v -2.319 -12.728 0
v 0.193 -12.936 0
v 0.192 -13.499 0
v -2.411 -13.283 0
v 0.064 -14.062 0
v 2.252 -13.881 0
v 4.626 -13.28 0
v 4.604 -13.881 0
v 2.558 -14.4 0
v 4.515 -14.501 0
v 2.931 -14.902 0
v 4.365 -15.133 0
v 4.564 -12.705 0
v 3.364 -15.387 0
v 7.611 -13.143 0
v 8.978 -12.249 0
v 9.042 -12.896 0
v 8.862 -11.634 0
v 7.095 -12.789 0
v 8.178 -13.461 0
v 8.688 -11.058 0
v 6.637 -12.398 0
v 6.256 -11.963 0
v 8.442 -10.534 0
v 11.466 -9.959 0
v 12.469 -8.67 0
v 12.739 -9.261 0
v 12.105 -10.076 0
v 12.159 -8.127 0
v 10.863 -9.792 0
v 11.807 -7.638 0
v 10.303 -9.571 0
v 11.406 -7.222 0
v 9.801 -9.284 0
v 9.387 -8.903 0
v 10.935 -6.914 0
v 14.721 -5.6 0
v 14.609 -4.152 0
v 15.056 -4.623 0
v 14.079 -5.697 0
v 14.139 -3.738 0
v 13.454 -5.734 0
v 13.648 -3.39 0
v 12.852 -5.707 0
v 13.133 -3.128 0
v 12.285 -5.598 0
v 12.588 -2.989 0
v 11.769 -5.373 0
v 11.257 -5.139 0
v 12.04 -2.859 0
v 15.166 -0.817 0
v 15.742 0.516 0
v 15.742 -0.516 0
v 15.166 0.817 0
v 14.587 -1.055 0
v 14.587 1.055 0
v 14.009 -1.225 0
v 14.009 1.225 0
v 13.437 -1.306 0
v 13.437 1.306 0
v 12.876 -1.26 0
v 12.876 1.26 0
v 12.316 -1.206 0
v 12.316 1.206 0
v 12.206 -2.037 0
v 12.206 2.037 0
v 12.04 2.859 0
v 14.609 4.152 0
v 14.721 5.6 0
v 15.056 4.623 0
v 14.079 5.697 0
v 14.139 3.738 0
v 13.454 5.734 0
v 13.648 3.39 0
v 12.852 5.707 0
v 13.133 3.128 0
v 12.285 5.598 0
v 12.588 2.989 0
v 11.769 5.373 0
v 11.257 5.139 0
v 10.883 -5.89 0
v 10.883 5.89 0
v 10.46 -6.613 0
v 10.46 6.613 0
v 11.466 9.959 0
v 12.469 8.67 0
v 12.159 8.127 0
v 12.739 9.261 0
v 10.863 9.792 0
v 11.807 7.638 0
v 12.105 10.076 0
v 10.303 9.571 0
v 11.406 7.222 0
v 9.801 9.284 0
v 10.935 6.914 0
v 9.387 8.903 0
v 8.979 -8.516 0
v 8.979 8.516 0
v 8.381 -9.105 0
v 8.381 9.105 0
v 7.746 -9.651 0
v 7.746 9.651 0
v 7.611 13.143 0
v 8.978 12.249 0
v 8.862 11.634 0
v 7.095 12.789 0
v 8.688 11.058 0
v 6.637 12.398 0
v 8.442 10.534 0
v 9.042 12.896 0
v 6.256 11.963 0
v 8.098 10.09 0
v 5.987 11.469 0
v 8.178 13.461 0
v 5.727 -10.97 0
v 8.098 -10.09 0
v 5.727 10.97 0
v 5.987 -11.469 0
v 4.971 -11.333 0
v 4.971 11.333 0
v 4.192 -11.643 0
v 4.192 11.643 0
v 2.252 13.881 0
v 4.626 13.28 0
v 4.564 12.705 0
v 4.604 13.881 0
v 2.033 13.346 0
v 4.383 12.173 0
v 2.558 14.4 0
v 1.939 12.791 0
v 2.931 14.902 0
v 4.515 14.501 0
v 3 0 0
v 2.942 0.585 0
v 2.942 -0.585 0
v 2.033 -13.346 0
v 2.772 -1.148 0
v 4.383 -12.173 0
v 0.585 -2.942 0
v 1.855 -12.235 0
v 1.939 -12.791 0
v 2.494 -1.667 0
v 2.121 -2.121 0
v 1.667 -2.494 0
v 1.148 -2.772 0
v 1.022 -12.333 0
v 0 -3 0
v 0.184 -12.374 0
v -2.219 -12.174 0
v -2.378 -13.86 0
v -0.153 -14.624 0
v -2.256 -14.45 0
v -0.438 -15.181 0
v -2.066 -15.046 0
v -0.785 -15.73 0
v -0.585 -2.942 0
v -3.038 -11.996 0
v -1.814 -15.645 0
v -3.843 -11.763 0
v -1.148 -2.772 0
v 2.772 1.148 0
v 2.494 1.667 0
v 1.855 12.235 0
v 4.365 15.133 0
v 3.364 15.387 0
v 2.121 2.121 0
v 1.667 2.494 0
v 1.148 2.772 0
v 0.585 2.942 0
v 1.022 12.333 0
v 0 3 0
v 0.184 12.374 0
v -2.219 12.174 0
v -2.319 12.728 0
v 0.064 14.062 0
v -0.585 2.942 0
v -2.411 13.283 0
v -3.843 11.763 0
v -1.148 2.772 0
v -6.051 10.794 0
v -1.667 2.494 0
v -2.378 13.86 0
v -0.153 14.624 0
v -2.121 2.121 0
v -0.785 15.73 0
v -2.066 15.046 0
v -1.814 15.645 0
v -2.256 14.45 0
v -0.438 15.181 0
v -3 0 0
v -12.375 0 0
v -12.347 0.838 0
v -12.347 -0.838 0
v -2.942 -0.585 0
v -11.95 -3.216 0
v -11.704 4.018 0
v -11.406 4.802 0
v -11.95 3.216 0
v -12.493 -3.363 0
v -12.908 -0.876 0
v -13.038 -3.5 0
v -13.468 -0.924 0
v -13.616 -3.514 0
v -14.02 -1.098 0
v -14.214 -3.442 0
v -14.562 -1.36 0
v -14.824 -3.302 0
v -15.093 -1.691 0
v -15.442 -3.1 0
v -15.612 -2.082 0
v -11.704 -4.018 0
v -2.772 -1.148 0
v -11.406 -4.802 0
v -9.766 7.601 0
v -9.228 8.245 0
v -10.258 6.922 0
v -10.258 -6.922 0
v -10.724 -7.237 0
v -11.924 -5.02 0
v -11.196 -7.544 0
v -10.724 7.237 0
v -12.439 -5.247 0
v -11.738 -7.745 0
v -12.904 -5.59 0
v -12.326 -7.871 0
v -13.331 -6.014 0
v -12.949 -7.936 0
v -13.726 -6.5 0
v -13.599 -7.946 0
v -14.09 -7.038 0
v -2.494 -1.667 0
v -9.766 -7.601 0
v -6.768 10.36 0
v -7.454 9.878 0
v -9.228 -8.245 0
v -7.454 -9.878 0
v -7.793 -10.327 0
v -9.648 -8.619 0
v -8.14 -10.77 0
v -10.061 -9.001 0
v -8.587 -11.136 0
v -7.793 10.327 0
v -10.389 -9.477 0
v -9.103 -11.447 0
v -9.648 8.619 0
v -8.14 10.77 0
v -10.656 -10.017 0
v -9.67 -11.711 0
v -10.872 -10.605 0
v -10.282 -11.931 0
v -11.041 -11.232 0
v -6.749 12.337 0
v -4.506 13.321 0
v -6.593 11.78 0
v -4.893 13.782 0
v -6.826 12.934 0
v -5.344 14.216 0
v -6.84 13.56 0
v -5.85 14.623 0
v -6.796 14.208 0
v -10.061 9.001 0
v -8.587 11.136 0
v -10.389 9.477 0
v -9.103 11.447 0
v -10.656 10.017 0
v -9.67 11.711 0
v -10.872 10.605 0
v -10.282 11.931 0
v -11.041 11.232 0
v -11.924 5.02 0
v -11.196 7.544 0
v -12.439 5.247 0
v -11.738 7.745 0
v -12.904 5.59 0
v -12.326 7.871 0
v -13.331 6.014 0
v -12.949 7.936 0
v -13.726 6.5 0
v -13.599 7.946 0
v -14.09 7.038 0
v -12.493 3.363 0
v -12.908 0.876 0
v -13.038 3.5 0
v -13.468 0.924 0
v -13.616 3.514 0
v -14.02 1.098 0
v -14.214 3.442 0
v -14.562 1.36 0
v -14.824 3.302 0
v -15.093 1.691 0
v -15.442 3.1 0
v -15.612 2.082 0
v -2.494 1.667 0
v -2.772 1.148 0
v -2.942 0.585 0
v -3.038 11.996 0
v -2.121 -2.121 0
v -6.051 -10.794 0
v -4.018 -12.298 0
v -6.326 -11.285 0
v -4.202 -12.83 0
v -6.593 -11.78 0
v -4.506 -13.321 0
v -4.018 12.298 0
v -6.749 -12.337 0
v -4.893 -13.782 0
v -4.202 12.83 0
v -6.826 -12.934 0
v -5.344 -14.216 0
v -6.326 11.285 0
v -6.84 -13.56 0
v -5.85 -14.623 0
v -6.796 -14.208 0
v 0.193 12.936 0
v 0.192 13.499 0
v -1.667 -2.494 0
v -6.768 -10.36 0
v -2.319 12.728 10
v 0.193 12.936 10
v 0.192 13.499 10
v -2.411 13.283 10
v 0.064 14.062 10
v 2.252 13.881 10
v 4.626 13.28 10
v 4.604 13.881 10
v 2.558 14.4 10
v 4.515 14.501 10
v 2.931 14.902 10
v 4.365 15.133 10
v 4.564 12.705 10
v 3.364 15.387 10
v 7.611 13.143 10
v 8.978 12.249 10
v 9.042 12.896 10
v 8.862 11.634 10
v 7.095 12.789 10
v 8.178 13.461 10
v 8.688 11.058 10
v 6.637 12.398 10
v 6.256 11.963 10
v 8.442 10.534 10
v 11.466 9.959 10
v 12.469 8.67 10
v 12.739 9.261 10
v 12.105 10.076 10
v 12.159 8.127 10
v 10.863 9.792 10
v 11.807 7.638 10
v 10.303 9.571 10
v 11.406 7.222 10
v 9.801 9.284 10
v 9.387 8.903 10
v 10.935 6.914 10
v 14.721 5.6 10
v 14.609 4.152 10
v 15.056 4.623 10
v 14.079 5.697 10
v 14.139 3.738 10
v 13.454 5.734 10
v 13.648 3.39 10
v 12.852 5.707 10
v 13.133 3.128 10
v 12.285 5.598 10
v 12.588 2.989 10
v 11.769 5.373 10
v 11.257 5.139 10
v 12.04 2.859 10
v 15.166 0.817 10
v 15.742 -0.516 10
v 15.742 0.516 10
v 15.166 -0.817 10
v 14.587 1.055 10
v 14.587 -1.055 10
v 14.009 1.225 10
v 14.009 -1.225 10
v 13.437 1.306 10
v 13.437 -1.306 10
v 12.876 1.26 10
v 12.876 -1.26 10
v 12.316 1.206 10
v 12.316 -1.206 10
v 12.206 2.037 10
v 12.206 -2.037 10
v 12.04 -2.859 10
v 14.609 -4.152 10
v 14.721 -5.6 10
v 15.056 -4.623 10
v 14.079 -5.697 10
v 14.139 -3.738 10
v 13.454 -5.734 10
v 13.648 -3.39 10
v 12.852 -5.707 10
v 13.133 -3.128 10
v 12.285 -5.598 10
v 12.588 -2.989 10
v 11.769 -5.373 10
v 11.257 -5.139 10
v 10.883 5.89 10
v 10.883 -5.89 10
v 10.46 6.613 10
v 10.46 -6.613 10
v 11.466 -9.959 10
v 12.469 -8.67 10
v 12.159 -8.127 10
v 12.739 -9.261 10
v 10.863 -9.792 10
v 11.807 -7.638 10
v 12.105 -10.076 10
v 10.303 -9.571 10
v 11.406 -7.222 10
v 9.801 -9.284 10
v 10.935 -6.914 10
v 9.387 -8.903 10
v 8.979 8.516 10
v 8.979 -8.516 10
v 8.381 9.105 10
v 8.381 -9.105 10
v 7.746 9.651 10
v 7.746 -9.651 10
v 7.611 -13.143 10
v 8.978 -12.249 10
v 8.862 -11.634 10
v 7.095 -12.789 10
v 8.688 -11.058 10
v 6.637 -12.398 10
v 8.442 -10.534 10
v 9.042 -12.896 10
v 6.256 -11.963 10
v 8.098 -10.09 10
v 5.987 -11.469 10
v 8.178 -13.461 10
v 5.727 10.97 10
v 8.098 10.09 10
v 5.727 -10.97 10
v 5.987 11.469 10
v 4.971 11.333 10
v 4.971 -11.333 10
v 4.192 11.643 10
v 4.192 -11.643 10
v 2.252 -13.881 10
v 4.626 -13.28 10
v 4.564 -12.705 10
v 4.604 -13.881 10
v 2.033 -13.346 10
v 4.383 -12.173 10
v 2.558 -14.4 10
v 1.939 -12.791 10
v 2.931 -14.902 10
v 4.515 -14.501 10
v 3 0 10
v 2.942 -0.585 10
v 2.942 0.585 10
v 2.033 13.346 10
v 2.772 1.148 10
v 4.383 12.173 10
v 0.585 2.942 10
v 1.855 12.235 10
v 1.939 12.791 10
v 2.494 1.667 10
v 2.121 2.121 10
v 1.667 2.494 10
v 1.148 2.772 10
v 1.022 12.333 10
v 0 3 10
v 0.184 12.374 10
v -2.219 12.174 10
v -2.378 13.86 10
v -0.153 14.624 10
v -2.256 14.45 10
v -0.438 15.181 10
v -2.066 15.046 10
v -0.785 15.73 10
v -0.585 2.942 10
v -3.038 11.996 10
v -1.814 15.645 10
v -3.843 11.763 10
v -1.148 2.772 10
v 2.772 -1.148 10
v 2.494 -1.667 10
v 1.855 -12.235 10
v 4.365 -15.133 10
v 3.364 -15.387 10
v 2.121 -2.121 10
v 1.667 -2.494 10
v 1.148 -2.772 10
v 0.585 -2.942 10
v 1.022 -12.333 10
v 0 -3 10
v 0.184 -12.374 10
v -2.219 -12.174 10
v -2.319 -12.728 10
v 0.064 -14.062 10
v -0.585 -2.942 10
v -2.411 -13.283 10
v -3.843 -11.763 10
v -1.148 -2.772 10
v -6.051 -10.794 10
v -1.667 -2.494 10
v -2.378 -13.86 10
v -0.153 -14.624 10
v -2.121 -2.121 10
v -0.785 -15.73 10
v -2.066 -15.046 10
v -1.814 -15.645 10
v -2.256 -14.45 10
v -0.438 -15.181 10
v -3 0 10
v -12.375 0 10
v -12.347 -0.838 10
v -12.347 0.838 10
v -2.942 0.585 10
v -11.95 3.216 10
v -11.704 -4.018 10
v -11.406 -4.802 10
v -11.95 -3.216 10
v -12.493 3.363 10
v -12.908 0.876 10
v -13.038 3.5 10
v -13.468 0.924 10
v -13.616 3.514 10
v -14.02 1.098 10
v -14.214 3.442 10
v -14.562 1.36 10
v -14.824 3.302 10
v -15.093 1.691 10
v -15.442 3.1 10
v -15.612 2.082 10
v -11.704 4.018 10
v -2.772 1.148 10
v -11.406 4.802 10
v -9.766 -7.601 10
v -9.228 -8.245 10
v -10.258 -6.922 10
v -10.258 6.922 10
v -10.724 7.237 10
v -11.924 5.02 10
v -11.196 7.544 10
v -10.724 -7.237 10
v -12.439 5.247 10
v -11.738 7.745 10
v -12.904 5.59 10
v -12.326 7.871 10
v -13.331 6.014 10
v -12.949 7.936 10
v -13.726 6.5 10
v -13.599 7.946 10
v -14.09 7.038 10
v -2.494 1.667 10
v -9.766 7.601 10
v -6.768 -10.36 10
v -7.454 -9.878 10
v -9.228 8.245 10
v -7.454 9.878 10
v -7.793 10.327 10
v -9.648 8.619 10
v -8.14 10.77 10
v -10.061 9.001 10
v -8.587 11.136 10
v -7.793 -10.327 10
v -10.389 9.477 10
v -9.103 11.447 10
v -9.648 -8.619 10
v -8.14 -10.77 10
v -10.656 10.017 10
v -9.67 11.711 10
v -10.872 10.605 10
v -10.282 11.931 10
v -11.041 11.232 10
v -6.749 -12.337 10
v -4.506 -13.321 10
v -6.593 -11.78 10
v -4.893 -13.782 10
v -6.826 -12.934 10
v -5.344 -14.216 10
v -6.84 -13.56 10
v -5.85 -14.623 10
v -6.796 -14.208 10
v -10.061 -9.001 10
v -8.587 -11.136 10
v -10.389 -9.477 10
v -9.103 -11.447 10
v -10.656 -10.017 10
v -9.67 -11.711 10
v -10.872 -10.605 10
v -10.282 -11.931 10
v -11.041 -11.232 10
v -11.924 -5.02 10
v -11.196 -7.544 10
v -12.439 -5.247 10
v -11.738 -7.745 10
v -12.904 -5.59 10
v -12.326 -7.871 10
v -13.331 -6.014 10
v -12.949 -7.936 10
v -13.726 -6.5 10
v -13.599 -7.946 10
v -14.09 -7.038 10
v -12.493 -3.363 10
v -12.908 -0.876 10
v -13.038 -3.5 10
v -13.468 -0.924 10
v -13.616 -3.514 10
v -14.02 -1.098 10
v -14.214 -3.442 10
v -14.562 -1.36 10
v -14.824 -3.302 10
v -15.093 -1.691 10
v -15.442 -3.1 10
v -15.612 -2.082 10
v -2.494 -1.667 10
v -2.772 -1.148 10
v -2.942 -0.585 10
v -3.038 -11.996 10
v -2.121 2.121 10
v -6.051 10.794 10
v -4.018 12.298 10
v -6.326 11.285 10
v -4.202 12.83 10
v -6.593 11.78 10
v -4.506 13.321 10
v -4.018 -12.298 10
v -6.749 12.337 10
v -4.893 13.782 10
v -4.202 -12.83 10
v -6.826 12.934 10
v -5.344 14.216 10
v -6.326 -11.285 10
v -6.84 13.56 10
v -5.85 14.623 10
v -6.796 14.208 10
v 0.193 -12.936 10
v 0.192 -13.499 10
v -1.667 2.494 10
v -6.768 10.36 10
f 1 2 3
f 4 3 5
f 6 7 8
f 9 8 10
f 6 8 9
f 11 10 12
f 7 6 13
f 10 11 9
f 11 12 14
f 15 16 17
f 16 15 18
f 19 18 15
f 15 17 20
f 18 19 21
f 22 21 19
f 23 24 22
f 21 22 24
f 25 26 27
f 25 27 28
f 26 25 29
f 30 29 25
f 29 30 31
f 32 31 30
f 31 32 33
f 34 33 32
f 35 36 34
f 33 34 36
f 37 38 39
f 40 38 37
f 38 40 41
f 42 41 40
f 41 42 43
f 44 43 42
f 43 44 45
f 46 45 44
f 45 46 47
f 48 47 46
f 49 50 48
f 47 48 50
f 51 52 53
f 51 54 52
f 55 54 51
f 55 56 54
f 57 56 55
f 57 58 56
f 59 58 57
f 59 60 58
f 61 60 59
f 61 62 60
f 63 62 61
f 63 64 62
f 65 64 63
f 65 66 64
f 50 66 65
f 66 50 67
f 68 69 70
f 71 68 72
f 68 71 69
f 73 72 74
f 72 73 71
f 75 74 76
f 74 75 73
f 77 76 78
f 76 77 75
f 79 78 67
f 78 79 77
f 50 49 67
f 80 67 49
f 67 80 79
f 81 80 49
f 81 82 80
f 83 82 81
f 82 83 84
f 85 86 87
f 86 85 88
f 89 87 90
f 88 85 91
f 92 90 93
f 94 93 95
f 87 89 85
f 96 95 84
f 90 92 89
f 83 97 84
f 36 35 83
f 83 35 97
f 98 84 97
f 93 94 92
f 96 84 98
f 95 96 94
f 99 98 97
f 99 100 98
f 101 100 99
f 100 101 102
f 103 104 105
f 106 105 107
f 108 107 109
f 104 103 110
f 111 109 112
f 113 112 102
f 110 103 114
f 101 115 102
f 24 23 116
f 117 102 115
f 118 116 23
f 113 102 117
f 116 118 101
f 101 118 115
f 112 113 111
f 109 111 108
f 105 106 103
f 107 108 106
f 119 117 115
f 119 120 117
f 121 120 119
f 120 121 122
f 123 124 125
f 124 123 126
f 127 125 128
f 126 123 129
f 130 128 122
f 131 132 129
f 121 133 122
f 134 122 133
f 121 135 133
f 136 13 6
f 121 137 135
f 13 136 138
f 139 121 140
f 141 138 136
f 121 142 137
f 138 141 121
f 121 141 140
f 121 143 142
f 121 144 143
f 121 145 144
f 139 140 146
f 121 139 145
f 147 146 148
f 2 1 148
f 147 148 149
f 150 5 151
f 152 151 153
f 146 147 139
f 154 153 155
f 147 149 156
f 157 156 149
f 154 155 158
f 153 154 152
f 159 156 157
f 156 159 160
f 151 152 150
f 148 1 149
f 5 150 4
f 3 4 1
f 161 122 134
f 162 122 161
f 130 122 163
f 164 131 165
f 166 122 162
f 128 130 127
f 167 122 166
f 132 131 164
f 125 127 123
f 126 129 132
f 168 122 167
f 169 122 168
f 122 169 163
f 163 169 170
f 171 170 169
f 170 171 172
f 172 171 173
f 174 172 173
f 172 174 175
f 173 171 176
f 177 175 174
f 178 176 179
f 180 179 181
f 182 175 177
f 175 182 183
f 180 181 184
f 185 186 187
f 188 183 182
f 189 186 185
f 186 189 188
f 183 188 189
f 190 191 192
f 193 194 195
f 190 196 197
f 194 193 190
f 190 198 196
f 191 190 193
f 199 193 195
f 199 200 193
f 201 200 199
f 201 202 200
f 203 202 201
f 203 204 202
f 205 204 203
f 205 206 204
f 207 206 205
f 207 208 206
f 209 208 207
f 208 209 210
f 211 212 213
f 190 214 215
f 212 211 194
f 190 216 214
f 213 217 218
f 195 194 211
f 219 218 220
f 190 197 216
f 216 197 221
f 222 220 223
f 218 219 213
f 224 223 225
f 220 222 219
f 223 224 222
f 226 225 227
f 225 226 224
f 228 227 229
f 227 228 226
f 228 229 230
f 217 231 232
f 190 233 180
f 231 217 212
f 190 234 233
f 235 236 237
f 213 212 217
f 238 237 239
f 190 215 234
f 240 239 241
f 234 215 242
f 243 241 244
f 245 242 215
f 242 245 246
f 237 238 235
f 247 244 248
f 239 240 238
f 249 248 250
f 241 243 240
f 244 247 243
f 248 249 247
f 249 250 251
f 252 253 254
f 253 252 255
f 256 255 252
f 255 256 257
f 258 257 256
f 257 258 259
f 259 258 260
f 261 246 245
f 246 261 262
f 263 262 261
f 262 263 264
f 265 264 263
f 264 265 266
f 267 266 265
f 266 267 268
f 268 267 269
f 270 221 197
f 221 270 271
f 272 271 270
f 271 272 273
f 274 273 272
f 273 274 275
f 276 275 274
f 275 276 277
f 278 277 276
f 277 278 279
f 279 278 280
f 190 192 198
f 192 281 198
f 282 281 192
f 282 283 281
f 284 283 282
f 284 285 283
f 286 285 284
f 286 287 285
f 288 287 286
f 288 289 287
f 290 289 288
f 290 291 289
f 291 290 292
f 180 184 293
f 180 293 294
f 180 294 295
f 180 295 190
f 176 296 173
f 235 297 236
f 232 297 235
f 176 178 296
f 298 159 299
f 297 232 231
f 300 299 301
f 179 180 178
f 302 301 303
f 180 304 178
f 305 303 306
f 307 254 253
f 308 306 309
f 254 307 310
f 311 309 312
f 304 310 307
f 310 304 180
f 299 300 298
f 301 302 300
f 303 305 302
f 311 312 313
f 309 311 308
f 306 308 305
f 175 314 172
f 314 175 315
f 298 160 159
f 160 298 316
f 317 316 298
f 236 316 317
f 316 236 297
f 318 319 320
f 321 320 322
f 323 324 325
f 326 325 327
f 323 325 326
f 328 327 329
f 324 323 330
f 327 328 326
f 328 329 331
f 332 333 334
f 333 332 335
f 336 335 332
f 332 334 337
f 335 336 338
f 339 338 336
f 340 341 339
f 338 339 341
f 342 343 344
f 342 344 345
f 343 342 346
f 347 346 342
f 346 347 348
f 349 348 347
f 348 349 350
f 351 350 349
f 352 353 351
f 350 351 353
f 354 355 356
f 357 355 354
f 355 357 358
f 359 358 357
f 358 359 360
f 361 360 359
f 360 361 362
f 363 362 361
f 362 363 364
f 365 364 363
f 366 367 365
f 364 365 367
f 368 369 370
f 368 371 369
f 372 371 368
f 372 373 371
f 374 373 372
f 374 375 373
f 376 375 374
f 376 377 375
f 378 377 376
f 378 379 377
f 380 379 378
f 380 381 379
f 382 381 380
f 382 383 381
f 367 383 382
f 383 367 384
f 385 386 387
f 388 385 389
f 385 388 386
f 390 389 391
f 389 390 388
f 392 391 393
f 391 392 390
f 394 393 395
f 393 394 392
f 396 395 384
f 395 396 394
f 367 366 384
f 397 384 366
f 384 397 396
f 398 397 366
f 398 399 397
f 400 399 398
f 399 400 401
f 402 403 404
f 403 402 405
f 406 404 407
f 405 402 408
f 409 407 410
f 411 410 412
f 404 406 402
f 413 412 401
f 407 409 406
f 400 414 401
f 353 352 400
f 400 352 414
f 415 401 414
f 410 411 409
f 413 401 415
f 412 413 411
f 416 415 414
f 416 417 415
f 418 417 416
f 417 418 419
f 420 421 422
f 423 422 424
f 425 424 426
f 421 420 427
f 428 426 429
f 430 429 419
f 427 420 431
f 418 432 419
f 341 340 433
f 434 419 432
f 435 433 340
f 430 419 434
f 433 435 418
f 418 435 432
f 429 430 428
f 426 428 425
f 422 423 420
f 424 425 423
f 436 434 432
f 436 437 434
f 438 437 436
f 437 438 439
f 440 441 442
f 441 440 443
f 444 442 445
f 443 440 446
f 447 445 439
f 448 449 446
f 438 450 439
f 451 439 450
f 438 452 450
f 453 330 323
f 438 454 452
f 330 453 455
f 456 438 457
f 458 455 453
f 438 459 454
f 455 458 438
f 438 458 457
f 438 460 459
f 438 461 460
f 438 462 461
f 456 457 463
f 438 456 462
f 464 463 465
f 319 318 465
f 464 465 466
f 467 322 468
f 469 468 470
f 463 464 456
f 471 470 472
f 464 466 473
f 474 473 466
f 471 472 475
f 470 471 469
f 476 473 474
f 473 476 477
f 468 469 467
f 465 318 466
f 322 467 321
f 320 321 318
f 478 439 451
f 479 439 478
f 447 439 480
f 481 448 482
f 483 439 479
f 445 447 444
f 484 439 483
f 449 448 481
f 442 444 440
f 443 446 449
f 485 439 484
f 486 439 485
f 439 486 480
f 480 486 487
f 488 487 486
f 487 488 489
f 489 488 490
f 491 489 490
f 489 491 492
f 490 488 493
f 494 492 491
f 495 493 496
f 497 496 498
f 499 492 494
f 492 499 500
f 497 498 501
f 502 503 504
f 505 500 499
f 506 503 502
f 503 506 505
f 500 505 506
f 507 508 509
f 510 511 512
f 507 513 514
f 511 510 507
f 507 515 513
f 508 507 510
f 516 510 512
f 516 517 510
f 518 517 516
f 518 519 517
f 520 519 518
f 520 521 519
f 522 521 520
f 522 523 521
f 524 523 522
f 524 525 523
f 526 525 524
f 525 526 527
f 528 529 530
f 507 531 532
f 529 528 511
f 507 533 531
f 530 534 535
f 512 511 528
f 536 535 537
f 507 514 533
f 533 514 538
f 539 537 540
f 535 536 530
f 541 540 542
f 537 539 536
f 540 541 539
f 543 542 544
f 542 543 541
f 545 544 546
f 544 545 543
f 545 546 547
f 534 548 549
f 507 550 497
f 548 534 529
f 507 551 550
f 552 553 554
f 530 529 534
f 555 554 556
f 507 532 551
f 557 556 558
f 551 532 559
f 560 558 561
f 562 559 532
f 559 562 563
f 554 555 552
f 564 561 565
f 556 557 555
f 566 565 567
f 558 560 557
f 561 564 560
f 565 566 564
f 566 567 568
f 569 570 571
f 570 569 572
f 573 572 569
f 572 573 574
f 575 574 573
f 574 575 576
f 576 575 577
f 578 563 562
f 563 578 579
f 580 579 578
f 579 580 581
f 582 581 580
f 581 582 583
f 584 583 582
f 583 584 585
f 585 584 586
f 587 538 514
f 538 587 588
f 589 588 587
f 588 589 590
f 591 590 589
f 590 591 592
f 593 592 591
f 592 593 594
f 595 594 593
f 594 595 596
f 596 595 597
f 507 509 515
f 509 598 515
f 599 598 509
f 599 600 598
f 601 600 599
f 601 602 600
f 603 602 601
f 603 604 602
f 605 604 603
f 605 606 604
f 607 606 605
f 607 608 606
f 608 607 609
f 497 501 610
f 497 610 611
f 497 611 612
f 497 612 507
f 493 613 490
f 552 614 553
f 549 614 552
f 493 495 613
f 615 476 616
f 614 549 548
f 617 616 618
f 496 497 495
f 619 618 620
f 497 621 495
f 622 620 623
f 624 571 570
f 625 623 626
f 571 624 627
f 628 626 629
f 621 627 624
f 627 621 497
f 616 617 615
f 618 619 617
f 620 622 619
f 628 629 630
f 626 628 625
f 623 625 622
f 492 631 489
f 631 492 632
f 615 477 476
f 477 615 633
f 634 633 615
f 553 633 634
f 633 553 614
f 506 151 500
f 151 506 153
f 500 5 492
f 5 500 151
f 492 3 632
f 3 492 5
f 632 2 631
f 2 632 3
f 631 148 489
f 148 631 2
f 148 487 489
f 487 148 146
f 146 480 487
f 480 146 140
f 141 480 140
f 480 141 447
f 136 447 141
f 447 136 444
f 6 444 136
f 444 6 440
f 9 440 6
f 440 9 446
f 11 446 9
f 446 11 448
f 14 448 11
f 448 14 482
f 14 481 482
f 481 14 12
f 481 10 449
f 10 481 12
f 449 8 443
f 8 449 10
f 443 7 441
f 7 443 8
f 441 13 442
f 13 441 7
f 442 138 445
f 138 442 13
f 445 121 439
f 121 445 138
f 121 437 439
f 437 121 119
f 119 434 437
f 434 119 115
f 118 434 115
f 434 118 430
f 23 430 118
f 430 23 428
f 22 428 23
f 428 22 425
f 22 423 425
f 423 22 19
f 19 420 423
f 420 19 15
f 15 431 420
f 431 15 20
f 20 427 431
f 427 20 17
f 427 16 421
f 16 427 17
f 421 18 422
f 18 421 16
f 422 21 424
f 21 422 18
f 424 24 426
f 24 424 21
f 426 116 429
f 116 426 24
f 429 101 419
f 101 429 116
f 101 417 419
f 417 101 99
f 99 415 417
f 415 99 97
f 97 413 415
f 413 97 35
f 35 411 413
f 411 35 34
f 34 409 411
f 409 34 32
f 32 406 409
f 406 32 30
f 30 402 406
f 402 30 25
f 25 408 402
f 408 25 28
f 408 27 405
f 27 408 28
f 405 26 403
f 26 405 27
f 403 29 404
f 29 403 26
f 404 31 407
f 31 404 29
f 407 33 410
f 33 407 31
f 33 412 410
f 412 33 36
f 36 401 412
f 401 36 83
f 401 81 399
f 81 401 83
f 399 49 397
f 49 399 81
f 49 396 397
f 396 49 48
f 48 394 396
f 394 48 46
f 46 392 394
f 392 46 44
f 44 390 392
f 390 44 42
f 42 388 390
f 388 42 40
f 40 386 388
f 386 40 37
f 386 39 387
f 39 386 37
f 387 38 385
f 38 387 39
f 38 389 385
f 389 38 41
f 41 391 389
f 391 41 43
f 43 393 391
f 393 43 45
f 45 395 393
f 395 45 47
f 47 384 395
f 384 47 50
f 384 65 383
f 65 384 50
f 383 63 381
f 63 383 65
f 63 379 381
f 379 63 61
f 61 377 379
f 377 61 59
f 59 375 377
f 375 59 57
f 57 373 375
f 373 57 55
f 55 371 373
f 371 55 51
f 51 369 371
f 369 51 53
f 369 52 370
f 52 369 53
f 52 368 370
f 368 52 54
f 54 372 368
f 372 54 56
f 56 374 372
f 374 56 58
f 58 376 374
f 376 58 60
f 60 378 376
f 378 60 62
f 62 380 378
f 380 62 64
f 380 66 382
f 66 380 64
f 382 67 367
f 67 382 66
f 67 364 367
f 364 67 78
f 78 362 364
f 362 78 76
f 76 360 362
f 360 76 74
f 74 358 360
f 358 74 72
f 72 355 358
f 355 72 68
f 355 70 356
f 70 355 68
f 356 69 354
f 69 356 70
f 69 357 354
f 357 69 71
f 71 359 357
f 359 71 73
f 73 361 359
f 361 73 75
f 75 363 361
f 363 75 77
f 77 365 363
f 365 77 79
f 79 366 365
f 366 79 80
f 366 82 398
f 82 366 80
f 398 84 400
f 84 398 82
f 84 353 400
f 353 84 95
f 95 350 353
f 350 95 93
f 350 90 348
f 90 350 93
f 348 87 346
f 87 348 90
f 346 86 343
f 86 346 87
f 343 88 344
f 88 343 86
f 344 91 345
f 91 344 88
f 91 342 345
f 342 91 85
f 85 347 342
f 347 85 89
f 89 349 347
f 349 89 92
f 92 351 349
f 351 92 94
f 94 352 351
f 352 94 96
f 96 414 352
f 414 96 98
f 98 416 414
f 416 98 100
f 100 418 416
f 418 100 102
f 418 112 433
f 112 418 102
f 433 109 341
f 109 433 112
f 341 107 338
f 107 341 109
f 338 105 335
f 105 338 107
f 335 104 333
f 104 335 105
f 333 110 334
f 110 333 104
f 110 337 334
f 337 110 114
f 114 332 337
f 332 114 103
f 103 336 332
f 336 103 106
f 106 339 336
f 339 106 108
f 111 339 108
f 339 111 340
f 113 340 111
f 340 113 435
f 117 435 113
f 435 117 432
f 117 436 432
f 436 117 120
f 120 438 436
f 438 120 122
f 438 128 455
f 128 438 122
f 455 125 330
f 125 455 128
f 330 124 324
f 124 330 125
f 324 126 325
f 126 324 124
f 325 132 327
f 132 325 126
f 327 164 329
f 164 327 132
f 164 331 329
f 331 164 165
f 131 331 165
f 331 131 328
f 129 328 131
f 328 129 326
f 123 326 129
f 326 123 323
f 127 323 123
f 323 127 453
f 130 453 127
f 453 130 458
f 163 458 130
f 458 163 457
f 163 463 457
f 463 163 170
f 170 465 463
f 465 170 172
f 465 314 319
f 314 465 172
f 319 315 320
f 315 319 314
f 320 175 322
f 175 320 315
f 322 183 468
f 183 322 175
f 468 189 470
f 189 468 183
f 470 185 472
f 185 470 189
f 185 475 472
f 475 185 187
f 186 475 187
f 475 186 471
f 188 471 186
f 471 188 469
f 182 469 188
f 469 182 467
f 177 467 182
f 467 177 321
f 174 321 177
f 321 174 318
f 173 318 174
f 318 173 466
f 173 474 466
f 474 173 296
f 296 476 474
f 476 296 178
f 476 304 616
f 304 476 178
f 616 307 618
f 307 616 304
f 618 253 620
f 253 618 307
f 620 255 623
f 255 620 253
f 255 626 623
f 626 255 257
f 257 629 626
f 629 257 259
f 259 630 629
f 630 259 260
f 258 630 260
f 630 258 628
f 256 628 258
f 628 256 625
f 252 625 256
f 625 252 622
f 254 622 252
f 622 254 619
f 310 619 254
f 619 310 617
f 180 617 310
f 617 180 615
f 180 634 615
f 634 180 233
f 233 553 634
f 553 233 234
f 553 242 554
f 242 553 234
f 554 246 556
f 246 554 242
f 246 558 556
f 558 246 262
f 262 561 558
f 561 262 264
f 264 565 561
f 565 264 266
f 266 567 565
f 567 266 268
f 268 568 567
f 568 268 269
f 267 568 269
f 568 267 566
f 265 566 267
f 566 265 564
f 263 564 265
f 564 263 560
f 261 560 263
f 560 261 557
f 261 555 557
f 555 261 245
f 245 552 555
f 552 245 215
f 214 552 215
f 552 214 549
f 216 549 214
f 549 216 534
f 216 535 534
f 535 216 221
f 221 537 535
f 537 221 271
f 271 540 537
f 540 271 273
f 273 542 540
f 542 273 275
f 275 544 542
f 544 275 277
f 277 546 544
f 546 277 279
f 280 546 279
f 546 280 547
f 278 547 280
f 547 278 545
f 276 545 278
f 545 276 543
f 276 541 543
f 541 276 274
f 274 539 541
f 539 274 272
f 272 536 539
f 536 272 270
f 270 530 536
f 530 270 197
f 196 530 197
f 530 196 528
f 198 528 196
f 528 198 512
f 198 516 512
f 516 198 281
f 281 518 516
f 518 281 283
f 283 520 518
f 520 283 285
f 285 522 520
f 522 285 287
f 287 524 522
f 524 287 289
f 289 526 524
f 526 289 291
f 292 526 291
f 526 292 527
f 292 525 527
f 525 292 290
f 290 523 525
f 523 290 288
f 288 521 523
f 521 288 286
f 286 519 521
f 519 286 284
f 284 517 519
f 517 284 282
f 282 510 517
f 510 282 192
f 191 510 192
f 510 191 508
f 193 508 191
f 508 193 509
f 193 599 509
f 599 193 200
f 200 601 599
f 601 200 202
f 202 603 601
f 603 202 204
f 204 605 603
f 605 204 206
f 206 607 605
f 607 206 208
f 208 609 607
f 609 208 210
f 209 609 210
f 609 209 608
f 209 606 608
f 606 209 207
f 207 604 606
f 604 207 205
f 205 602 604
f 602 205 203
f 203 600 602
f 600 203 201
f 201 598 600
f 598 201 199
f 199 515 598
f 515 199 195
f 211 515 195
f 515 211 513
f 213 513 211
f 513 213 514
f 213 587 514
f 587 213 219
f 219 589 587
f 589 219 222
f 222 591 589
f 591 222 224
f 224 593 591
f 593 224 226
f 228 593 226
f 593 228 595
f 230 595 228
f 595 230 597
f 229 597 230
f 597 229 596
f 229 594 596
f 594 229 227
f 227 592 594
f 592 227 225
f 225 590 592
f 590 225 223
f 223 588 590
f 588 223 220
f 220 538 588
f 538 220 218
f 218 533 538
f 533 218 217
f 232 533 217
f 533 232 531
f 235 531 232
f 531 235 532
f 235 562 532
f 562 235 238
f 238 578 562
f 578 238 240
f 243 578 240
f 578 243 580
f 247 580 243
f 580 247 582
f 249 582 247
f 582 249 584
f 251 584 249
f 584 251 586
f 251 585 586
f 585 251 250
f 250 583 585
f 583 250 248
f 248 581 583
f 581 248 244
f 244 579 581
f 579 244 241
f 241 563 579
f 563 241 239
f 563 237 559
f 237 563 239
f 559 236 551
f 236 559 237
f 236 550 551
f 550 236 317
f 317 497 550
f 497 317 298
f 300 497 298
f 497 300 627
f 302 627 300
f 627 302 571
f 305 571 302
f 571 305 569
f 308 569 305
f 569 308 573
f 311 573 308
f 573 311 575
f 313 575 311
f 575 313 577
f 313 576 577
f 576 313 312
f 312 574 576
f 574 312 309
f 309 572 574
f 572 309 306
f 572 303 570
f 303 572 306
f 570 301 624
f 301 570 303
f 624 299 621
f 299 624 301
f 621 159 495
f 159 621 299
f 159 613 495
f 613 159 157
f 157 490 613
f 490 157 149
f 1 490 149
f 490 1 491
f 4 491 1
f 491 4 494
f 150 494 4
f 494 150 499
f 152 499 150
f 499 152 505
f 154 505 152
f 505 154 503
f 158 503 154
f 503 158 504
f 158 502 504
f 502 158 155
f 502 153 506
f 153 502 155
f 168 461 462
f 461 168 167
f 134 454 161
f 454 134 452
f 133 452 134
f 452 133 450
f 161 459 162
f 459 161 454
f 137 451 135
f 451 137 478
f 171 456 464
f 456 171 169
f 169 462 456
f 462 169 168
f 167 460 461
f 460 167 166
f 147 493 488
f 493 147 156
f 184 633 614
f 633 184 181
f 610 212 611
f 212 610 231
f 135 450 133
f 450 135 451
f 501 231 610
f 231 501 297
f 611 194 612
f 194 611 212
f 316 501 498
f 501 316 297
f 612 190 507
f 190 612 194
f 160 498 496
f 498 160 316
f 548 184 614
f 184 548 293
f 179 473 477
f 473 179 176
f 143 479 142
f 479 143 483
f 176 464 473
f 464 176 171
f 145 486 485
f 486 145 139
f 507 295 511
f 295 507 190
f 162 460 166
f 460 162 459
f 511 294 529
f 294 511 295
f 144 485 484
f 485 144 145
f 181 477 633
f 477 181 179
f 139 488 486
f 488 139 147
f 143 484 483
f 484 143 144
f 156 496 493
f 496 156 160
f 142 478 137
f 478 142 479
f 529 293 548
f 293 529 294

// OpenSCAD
$fn = 32;

// ----------------------------------------------------------------------
// Spur gear: m=1.5 z=19, 31.5 mm tip diameter x 10 mm
// ----------------------------------------------------------------------

// --- parameters (mm) ---
modul = 1.5;              // module
n_teeth = 19;             // number of teeth
width = 10;               // face width
pa = 20;                  // pressure angle, deg
shaft_d = 6;              // shaft bore

/* --- involute profile --- */
pitch_r = modul * n_teeth / 2;
base_r = pitch_r * cos(pa);
tip_r = pitch_r + modul;
root_r = pitch_r - 1.25 * modul;
flank_steps = 6;

function inv_deg(a) = (tan(a) - a * PI / 180) * 180 / PI;
function flank_r(i) = root_r + (tip_r - root_r) * i / flank_steps;
function half_angle(r) = 90 / n_teeth + inv_deg(pa) - inv_deg(acos(min(1, base_r / r)));
function tooth_pt(k, i, side) =
    let (r = flank_r(i), a = k * 360 / n_teeth + side * half_angle(r))
    [r * cos(a), r * sin(a)];

module tooth_profile() {
  polygon(points = [
    for (k = [0 : n_teeth - 1])
      each [
        for (i = [0 : flank_steps]) tooth_pt(k, i, -1),
        for (i = [flank_steps : -1 : 0]) tooth_pt(k, i, 1),
        let (ta = (k + 0.5) * 360 / n_teeth)
          [root_r * cos(ta), root_r * sin(ta)]
      ]
  ]);
}

module gear_disc() {
  linear_extrude(height = width) tooth_profile();
}

difference() {
  gear_disc();
  translate([0, 0, -1]) cylinder(h = width + 3, d = shaft_d);
}
